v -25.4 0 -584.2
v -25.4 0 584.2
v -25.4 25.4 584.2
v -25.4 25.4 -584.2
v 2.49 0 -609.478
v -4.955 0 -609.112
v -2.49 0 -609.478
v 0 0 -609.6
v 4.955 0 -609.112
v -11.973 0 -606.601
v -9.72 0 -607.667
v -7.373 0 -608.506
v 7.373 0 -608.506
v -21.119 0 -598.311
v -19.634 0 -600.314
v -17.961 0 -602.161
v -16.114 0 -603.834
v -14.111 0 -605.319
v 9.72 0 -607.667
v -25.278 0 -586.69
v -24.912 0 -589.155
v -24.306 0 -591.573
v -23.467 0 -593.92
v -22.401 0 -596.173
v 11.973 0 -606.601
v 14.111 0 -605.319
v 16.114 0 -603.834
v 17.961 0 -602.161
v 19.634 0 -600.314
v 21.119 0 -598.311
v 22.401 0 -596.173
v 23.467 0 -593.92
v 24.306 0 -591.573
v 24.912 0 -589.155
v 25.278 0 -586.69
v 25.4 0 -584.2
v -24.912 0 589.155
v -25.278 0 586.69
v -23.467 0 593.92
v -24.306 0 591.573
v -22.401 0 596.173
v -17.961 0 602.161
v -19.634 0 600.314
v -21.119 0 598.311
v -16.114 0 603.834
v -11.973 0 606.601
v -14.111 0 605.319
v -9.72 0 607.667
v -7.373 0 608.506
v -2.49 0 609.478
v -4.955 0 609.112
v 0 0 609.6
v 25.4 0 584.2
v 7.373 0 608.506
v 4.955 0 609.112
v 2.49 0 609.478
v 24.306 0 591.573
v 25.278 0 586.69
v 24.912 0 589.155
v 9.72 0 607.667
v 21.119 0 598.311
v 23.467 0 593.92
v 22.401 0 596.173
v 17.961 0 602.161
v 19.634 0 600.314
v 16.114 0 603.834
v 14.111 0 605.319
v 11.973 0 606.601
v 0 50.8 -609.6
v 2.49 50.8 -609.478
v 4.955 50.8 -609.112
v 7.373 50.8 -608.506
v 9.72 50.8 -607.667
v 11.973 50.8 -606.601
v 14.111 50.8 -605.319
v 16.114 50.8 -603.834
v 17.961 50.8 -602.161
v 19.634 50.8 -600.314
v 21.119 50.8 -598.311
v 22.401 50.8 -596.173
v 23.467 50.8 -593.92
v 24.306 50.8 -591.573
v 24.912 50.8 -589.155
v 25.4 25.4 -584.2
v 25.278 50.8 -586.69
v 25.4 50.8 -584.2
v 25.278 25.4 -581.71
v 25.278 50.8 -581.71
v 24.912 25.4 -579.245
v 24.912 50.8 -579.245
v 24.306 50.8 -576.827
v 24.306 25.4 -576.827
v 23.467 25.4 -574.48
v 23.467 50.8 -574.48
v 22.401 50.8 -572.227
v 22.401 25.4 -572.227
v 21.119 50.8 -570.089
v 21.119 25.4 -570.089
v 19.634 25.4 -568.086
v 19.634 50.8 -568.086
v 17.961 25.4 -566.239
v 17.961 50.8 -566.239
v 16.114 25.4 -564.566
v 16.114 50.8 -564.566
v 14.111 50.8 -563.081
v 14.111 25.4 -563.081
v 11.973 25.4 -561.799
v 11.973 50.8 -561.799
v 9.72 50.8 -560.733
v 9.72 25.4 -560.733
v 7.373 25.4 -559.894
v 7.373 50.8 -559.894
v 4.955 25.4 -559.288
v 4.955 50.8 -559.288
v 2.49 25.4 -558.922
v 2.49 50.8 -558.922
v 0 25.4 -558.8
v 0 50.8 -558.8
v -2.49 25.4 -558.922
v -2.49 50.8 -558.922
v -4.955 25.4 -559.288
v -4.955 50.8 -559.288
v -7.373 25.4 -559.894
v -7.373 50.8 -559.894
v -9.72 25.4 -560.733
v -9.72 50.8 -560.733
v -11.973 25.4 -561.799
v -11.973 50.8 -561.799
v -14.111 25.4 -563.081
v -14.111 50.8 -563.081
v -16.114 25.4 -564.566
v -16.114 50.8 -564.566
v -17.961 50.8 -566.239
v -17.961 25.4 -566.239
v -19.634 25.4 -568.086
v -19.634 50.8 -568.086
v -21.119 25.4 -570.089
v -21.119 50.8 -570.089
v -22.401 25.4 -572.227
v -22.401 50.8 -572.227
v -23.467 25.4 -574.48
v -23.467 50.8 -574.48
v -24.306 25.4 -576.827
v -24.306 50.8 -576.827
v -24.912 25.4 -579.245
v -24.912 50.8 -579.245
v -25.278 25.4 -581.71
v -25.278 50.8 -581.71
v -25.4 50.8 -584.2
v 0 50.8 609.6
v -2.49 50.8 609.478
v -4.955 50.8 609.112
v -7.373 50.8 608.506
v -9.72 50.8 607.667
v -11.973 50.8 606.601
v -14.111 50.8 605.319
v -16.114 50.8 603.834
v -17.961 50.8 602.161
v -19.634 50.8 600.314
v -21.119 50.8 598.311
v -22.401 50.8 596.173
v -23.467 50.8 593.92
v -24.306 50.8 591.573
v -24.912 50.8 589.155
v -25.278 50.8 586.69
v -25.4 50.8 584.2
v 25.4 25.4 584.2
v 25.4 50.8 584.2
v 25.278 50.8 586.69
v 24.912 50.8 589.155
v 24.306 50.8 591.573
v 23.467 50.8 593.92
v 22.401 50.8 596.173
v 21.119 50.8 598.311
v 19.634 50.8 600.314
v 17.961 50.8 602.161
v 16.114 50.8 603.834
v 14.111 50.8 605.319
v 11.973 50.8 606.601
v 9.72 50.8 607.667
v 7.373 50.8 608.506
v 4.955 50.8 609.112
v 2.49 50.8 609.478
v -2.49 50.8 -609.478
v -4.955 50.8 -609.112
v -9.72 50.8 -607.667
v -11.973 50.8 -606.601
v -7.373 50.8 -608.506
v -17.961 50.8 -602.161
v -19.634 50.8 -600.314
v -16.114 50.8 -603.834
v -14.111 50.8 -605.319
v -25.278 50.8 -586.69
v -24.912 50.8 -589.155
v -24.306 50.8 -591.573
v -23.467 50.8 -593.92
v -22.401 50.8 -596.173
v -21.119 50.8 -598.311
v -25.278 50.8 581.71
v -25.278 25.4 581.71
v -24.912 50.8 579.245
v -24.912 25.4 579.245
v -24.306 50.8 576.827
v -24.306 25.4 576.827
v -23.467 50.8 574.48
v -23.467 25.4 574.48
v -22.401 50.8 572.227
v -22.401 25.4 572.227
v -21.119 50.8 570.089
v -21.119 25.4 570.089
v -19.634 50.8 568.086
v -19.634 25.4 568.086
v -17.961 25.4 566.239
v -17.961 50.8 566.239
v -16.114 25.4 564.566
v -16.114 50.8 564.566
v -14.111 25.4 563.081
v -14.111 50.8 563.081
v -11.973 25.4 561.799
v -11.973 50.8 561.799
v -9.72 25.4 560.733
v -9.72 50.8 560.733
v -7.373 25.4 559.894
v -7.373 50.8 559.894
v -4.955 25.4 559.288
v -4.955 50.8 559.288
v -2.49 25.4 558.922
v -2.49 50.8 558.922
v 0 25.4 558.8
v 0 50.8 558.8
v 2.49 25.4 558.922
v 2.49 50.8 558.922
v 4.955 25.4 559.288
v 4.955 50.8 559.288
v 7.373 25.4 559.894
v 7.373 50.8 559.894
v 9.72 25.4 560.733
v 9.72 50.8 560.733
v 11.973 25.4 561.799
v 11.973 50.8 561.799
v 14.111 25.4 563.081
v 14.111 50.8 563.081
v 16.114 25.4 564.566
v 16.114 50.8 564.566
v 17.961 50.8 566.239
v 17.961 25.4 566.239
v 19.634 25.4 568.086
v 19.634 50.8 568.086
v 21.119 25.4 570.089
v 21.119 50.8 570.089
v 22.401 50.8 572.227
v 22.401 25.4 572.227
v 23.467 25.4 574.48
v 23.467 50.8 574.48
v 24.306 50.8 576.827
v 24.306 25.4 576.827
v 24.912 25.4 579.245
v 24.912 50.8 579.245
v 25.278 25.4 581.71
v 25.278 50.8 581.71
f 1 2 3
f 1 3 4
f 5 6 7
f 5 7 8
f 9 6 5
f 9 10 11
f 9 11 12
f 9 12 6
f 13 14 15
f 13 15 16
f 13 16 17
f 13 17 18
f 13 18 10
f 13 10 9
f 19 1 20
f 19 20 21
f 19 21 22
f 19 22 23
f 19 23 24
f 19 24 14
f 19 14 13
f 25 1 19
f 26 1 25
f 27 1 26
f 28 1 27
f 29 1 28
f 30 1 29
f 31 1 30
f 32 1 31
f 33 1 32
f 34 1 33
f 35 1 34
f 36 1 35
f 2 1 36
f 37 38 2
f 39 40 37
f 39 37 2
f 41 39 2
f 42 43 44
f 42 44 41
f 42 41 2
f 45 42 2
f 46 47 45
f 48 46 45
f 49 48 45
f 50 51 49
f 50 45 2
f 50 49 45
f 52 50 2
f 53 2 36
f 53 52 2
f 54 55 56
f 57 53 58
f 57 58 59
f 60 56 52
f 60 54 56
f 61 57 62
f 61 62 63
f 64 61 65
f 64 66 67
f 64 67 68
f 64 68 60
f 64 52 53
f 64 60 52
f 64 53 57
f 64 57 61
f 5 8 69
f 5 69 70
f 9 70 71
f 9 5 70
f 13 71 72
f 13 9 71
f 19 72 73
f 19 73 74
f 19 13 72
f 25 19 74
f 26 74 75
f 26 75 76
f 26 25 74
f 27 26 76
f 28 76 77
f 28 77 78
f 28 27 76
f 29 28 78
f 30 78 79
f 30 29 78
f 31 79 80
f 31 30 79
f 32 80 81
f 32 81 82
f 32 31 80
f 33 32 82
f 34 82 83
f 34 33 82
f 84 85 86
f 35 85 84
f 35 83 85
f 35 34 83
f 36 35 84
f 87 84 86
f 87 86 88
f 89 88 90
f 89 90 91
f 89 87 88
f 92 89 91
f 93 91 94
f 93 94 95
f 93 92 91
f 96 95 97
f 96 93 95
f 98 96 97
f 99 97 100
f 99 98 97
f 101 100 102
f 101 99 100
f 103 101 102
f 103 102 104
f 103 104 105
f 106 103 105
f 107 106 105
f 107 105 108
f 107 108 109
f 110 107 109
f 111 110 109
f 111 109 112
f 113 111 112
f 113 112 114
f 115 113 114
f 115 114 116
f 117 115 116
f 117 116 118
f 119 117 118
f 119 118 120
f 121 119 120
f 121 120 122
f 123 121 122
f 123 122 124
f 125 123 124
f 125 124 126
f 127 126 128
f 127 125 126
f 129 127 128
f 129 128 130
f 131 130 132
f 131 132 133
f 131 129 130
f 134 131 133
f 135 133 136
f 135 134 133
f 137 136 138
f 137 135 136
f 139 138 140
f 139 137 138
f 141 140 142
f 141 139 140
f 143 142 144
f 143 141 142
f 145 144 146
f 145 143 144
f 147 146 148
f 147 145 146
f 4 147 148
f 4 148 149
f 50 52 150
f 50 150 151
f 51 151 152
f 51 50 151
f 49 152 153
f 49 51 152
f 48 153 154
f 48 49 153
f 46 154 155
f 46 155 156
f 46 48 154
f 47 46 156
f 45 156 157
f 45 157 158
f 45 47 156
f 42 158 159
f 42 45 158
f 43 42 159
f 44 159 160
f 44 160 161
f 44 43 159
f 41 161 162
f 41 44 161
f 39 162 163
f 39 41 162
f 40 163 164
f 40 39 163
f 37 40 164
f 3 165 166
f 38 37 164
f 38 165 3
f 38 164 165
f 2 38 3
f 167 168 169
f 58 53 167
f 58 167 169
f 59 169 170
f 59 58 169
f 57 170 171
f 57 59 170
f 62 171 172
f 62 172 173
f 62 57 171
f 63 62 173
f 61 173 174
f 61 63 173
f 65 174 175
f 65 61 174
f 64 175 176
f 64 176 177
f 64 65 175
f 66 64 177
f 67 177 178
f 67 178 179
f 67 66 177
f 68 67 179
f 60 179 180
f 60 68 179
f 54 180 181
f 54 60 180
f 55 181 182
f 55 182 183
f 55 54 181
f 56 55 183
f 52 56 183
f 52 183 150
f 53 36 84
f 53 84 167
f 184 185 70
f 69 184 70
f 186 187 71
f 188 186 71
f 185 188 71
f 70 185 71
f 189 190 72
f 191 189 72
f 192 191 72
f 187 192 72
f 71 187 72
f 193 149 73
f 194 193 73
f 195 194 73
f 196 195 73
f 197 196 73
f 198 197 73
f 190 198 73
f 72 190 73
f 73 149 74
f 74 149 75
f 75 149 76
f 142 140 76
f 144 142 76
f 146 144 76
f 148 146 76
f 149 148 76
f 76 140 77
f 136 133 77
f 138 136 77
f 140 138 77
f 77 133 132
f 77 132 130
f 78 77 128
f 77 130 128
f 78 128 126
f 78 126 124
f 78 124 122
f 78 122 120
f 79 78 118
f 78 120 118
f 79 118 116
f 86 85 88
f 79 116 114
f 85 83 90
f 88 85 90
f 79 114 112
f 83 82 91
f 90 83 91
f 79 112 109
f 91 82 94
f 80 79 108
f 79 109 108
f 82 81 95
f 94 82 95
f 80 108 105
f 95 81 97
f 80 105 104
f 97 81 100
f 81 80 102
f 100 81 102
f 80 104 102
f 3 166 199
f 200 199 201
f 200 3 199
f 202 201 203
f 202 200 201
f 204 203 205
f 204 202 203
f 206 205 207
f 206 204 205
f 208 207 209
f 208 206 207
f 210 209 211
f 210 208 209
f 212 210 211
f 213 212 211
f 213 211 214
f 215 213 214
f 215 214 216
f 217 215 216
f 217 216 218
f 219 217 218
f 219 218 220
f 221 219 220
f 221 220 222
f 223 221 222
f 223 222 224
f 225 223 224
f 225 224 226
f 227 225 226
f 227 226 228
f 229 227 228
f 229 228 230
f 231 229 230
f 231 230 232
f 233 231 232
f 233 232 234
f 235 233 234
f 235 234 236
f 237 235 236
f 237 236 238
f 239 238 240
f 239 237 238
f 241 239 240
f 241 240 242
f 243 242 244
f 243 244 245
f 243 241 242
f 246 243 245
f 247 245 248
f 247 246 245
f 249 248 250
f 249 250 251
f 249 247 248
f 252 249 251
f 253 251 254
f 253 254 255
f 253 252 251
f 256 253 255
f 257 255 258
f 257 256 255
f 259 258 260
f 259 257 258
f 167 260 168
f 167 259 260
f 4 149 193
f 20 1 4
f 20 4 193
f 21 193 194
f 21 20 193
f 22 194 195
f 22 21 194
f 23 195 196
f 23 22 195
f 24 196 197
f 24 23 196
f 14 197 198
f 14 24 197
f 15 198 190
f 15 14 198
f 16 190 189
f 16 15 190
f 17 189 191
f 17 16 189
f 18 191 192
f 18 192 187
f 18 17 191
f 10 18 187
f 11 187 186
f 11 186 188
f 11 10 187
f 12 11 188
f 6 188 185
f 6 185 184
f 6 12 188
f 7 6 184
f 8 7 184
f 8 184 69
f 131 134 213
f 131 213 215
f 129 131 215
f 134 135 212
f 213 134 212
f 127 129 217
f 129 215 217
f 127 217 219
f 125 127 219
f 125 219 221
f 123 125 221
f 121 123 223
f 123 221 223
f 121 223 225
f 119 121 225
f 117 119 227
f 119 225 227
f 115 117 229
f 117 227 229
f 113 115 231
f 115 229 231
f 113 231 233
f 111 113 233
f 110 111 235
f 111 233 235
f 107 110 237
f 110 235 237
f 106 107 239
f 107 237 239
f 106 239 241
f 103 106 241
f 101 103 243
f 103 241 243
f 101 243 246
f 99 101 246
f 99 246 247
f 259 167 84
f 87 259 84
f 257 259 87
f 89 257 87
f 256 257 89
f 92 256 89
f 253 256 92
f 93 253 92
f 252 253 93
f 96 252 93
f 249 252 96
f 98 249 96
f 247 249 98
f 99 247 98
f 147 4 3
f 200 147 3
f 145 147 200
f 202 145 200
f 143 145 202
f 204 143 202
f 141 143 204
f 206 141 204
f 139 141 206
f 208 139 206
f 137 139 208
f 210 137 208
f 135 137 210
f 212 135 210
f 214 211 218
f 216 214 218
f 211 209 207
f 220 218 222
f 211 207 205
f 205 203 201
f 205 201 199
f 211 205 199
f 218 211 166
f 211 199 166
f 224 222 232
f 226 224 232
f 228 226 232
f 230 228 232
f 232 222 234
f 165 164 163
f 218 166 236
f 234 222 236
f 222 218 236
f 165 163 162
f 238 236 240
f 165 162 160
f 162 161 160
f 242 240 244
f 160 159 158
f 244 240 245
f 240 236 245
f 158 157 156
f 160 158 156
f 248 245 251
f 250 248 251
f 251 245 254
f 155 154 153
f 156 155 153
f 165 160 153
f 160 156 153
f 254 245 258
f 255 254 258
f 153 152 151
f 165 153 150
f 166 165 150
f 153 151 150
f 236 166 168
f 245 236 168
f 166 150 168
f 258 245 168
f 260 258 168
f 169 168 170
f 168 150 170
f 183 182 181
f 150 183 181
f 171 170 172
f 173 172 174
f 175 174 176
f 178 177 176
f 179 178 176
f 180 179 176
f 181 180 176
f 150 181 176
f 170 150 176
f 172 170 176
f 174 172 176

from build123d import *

# Parameters (mm, degrees)
F1_DEPTH = 25.4
F2_DEPTH = 50.8


with BuildPart() as f1:
    # F0 (on Front) → F1 (new body)
    with BuildSketch(Plane.XZ):
        with BuildLine():
            Line((25.4, -584.2), (25.4, 584.2))
            ThreePointArc((25.4, 584.2), (0, 558.8), (-25.4, 584.2))
            Line((-25.4, 584.2), (-25.4, -584.2000000301))
            ThreePointArc((-25.4, -584.2000000301), (-1.51e-08, -558.8), (25.4, -584.2))
        make_face()
    extrude(amount=-F1_DEPTH)

    # F0 (on Front) → F2 (join)
    with BuildSketch(Plane.XZ):
        with BuildLine():
            ThreePointArc((25.4, 584.2), (17.9605121413, 602.160512343), (-2.853e-07, 609.6))
            ThreePointArc((-2.853e-07, 609.6), (-17.960512343, 602.1605121413), (-25.4, 584.2))
            ThreePointArc((-25.4, 584.2), (0, 558.8), (25.4, 584.2))
        make_face()
        with BuildLine():
            ThreePointArc((4.74e-07, -609.6), (17.9605124097, -602.1605120745), (25.4, -584.2))
            ThreePointArc((25.4, -584.2), (-1.51e-08, -558.8), (-25.4, -584.2000000301))
            ThreePointArc((-25.4, -584.2000000301), (-17.9605120639, -602.1605124204), (4.74e-07, -609.6))
        make_face()
    extrude(amount=-F2_DEPTH)


solid = f1.part
